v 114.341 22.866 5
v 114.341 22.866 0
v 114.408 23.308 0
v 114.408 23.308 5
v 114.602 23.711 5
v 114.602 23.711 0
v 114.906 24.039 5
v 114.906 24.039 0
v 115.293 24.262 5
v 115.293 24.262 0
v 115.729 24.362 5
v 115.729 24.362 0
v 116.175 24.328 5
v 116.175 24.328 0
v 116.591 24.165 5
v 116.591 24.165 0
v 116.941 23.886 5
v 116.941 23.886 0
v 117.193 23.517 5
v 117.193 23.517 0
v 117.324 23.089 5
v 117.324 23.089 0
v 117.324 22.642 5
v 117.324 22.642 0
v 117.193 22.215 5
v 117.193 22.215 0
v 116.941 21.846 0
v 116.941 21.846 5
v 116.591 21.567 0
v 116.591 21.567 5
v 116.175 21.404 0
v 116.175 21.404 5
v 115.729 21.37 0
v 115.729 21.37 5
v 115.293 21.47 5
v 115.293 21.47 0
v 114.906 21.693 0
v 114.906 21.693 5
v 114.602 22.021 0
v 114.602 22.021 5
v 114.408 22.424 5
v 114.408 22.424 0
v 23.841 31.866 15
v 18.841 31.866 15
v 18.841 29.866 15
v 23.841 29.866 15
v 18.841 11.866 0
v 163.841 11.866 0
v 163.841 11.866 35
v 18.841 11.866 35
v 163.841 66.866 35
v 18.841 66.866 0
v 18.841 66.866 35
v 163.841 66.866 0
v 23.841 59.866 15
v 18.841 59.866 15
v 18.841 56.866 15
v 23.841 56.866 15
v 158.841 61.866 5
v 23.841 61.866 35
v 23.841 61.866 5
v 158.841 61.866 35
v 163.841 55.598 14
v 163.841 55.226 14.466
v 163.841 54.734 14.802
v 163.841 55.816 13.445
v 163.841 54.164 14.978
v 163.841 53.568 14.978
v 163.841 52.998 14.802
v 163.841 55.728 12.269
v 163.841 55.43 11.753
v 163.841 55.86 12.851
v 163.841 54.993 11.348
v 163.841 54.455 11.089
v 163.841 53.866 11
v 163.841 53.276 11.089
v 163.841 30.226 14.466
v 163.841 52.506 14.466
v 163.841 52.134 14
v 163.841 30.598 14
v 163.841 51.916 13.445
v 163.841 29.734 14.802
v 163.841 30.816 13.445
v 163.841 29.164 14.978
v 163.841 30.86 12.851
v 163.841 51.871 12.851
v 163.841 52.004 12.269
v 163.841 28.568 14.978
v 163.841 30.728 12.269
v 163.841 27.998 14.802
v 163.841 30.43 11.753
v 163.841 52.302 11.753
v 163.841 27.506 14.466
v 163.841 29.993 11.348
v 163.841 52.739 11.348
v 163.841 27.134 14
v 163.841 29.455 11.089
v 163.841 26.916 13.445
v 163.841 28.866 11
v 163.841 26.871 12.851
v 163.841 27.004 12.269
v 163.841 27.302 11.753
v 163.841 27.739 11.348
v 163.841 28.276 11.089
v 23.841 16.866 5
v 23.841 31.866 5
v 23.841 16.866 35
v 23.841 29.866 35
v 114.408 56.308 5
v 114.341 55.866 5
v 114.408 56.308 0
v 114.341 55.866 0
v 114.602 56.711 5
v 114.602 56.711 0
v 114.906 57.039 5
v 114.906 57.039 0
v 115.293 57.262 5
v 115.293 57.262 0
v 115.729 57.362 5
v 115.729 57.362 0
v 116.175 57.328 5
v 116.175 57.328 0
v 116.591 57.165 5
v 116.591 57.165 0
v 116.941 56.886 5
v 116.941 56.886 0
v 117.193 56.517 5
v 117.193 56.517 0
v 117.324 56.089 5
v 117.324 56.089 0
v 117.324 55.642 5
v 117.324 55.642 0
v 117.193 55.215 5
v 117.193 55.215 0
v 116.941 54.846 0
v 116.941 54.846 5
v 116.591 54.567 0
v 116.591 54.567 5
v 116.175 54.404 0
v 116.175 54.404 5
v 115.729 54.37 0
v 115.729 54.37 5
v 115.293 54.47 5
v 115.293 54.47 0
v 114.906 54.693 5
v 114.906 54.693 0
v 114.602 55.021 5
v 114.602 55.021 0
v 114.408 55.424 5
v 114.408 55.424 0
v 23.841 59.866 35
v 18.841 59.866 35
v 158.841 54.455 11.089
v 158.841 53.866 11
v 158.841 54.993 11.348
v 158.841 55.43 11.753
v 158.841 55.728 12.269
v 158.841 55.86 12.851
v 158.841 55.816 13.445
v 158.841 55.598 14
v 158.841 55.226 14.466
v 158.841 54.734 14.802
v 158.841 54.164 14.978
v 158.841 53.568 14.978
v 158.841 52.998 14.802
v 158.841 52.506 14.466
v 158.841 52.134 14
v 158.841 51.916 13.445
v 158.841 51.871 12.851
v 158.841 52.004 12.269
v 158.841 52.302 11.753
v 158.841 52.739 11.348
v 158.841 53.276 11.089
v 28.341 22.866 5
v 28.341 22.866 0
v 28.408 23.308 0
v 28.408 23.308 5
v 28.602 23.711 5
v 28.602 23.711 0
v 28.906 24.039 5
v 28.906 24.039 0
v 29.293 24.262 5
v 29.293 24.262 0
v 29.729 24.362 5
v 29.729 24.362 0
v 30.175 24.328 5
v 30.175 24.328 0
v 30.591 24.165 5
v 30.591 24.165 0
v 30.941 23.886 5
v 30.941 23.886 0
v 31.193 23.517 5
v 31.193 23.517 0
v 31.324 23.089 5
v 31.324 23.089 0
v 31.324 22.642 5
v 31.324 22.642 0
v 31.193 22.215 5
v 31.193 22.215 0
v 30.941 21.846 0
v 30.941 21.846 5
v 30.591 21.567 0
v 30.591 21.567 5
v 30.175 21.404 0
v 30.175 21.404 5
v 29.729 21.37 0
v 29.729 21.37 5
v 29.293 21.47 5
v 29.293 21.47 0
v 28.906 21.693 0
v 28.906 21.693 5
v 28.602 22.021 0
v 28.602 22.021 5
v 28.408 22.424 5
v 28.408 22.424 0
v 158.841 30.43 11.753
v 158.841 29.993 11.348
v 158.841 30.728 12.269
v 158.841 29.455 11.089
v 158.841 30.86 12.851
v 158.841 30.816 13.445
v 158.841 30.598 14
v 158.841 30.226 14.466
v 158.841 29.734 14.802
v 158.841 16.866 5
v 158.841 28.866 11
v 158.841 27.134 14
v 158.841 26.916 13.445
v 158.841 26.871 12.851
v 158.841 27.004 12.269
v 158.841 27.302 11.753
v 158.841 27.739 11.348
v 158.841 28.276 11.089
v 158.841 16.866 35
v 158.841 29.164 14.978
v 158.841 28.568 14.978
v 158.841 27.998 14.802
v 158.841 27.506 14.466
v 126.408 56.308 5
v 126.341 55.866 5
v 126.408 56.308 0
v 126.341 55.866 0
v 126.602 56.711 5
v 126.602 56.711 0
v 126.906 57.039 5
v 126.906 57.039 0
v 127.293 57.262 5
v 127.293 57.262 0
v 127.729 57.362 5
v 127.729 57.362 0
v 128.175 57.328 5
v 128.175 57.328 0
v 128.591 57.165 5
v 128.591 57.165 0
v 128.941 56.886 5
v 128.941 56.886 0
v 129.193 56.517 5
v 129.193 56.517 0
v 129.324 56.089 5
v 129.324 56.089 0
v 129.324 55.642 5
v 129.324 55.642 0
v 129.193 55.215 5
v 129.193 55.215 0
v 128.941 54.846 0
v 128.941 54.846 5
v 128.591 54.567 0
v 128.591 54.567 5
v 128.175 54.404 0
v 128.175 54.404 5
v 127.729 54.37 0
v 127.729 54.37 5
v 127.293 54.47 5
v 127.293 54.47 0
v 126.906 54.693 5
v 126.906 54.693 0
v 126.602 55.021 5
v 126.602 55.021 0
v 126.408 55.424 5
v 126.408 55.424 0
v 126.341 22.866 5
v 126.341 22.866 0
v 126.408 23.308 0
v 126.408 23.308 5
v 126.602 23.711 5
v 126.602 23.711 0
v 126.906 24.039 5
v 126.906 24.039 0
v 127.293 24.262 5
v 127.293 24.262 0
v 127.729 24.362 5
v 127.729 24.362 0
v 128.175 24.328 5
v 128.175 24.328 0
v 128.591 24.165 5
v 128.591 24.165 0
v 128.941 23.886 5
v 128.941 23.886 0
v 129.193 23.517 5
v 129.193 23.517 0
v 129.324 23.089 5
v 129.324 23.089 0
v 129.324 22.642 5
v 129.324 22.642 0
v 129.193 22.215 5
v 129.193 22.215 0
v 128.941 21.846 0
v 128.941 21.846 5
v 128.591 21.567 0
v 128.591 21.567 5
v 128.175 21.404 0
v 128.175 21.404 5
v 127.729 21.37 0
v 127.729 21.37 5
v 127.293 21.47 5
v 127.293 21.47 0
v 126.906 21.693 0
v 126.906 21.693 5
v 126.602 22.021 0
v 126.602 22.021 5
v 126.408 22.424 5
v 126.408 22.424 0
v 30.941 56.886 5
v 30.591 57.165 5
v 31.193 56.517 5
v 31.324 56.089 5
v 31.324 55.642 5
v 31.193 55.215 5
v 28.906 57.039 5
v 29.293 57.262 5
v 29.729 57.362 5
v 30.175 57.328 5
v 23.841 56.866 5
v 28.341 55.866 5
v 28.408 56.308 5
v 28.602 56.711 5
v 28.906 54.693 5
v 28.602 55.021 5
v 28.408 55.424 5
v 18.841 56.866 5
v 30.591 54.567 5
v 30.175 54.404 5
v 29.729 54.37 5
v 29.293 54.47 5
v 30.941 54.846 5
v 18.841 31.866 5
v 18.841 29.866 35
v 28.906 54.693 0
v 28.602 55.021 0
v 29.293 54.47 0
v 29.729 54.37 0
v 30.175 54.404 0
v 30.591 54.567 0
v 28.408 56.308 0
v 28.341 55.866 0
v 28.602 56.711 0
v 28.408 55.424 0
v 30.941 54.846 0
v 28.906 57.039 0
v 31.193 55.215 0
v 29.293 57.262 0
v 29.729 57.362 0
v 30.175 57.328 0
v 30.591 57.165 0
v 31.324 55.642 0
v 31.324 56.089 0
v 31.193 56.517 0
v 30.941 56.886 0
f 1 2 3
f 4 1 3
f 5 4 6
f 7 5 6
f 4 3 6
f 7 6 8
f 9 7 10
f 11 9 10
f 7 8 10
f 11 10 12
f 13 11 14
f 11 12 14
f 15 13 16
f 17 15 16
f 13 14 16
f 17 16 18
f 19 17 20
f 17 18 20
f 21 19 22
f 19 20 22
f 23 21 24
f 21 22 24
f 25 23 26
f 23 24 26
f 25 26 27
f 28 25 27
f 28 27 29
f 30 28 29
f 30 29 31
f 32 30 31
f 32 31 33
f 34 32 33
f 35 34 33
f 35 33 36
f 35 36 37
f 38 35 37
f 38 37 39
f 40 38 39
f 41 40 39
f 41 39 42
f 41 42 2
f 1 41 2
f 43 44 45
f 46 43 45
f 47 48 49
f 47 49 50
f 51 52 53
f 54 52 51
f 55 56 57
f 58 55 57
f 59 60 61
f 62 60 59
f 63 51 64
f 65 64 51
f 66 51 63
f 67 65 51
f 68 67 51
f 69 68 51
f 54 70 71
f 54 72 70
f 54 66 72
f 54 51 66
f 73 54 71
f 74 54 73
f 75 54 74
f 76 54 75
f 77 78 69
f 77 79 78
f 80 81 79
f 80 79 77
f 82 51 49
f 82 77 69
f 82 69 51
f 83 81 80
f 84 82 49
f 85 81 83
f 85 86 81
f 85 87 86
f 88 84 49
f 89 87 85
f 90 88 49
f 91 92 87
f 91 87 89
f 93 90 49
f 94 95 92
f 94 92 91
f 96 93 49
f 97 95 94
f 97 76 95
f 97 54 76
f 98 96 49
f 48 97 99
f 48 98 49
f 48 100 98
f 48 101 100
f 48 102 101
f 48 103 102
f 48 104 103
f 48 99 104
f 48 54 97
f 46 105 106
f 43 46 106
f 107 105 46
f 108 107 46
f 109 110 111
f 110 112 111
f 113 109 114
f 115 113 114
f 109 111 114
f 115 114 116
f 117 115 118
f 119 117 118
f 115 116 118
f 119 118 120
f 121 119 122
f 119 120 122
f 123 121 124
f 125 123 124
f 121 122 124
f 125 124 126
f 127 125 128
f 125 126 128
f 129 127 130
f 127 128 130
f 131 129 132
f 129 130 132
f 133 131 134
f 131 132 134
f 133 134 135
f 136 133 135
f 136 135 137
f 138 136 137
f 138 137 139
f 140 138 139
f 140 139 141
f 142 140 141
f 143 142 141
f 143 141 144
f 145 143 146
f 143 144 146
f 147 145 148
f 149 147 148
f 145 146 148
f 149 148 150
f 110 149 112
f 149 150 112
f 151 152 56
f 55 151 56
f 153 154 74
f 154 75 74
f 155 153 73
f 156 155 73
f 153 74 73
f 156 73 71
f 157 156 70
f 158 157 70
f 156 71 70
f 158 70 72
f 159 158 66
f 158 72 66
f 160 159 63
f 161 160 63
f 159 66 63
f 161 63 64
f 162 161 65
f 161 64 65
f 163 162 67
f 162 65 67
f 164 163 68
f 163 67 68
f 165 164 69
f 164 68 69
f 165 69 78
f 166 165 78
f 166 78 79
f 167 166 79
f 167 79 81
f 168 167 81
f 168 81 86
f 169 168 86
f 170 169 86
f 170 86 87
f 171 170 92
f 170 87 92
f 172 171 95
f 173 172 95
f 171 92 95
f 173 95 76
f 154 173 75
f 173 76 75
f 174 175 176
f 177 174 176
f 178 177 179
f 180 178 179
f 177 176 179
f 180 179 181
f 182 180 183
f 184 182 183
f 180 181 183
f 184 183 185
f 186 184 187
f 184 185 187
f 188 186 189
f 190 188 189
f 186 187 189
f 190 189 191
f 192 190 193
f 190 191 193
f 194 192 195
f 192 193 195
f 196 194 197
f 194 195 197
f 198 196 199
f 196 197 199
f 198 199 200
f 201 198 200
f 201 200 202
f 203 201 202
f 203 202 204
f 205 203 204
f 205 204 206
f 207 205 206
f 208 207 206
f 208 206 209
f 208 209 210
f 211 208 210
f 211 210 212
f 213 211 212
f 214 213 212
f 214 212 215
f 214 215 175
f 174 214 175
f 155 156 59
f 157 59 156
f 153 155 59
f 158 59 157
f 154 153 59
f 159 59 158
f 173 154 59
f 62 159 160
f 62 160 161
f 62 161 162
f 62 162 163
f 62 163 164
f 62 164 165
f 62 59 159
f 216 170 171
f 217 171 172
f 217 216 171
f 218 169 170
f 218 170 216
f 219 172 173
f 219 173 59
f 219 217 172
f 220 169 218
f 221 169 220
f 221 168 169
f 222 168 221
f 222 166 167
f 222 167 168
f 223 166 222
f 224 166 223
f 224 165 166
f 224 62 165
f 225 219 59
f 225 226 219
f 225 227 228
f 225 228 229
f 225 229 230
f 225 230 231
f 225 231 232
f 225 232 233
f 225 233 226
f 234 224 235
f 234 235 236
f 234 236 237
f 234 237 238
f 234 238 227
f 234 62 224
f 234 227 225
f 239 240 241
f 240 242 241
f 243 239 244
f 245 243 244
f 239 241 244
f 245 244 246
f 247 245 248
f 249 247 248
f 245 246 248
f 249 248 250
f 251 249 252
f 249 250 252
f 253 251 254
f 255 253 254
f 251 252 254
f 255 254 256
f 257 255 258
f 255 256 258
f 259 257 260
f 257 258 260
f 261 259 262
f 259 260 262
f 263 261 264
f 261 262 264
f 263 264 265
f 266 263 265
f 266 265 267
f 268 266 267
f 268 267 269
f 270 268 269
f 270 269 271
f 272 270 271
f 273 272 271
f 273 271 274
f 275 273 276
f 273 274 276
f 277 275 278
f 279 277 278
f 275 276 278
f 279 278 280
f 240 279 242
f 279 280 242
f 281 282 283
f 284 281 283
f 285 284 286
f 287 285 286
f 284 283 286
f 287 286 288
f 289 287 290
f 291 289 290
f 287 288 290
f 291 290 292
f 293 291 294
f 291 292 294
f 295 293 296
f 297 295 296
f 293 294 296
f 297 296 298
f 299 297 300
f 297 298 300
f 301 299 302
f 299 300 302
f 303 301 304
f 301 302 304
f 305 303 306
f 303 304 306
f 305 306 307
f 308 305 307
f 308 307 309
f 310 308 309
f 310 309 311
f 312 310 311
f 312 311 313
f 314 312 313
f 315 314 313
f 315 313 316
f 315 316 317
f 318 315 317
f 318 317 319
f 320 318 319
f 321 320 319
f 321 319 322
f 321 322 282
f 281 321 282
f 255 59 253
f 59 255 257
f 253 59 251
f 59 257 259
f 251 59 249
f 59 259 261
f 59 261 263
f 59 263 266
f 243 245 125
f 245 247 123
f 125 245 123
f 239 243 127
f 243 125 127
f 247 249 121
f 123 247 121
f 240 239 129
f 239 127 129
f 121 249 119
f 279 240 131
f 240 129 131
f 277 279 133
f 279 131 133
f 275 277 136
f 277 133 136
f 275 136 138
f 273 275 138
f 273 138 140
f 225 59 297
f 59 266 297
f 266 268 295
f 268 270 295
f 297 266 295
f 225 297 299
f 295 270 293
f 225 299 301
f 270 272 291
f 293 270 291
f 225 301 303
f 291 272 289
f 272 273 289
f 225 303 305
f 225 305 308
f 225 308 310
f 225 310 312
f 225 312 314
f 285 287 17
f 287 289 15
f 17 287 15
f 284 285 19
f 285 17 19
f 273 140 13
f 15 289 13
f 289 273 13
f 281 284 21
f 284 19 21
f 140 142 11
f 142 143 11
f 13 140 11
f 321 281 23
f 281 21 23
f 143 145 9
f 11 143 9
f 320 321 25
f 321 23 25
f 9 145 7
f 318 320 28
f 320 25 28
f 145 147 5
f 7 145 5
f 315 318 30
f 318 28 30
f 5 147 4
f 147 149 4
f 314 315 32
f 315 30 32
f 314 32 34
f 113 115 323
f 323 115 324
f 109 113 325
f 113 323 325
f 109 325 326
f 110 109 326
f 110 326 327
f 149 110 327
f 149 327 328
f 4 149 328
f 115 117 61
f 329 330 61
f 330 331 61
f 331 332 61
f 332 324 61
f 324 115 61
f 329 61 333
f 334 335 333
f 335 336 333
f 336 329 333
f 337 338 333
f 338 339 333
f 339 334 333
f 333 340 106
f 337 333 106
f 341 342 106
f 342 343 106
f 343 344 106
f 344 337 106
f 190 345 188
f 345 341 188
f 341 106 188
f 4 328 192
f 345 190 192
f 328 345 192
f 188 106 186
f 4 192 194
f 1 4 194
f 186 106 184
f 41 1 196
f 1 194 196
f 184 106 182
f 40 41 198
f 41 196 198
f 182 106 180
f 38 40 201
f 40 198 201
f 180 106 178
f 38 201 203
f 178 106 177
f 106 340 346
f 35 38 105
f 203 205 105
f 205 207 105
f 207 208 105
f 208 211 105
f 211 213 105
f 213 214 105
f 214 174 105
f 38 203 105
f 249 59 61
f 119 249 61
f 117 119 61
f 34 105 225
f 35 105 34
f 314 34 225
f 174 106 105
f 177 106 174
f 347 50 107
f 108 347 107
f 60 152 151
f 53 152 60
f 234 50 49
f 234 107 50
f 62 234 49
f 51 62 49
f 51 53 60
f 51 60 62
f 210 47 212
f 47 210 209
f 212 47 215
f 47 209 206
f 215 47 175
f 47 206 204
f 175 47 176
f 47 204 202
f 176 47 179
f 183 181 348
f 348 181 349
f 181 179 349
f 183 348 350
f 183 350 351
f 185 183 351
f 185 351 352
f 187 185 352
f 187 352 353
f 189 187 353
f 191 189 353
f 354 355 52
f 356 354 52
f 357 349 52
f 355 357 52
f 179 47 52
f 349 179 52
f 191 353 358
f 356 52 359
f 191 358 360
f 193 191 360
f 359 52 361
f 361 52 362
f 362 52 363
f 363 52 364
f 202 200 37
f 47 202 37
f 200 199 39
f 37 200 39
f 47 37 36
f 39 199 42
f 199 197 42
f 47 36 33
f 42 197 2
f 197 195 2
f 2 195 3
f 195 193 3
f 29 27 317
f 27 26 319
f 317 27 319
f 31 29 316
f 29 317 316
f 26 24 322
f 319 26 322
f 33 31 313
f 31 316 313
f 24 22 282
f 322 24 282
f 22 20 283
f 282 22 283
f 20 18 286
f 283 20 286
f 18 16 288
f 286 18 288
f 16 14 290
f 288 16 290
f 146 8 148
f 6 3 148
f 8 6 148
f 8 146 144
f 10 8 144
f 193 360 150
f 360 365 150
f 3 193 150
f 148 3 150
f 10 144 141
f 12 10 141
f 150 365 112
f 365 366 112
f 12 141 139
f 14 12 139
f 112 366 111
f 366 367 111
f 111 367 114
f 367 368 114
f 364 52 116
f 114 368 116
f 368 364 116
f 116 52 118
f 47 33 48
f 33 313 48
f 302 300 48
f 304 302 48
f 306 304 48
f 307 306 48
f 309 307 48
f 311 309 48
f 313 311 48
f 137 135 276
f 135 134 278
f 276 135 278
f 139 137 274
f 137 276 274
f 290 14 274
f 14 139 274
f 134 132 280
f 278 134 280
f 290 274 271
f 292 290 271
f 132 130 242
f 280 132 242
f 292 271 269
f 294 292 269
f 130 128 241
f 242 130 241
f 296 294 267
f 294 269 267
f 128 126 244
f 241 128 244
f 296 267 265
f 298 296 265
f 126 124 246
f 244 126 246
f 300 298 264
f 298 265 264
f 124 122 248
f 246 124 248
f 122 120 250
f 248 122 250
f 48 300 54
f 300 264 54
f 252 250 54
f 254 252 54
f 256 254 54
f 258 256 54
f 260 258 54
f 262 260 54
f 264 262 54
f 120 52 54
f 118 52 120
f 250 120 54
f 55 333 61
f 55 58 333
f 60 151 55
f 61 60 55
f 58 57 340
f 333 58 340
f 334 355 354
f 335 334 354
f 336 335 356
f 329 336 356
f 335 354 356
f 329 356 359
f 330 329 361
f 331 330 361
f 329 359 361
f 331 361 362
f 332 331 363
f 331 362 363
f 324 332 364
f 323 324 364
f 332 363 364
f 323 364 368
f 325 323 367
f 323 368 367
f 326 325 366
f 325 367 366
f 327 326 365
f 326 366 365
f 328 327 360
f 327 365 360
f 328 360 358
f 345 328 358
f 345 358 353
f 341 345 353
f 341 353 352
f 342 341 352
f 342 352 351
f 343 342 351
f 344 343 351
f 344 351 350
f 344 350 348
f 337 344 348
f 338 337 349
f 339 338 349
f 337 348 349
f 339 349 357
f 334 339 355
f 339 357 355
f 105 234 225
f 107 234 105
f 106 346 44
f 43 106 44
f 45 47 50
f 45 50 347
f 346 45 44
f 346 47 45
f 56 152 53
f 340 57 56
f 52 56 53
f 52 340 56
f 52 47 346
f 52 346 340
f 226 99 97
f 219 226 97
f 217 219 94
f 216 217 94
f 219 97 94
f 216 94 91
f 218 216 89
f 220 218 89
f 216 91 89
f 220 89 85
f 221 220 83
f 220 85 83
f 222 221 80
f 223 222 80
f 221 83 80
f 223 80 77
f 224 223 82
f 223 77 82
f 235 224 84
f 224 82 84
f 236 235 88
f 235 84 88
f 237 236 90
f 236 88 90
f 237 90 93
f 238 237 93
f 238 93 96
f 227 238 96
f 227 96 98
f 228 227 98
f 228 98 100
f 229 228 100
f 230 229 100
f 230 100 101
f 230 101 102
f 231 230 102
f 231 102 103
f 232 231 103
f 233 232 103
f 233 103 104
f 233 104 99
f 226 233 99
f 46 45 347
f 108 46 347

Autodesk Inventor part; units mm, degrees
ref_plane "YZ Plane" through (0, 0, 0) normal (1, 0, 0) x (0, 1, 0)
ref_plane "XZ Plane" through (0, 0, 0) normal (0, 1, 0) x (-1, 0, 0)
ref_plane "XY Plane" through (0, 0, 0) normal (0, 0, 1) x (1, 0, 0)
sketch "Sketch1" plane through (0, 0, 0) normal (0, 0, 1) x (1, 0, 0)
  line L0 (18.8411, 66.8659) -> (163.8411, 66.8659)
  line L1 (163.8411, 66.8659) -> (163.8411, 11.8659)
  line L2 (163.8411, 11.8659) -> (18.8411, 11.8659)
  line L3 (18.8411, 11.8659) -> (18.8411, 66.8659)
  point P0 (0, 0)
  dimension "d0" = 55
  dimension "d1" = 145
extrude "Extrusion1" add sketch "Sketch1" along normal blind 35
sketch "Sketch2" plane through (0, 0, 35) normal (0, 0, 1) x (1, 0, 0)
  line L0 (23.8411, 61.8659) -> (158.8411, 61.8659)
  line L1 (158.8411, 61.8659) -> (158.8411, 16.8659)
  line L2 (158.8411, 16.8659) -> (23.8411, 16.8659)
  line L3 (23.8411, 16.8659) -> (23.8411, 61.8659)
  line L4 (18.8411, 66.8659) -> (18.8411, 11.8659) projected
  line L5 (163.8411, 66.8659) -> (18.8411, 66.8659) projected
  line L6 (163.8411, 11.8659) -> (163.8411, 66.8659) projected
  line L7 (18.8411, 11.8659) -> (163.8411, 11.8659) projected
  point P0 (0, 0)
  dimension "d4" = 5
  dimension "d5" = 5
  dimension "d6" = 5
  dimension "d7" = 5
extrude "Extrusion2" cut sketch "Sketch2" against normal blind 30 contours L0 L1 L2 L3
sketch "Sketch3" plane through (0, 0, 0) normal (0, 0, -1) x (-1, 0, 0)
  circle A0 centre (-29.8411, 22.8659) radius 1.5
  circle A1 centre (-29.8411, 55.8659) radius 1.5
  line L0 (-18.8411, 66.8659) -> (-18.8411, 11.8659) projected
  line L1 (-18.8411, 11.8659) -> (-163.8411, 11.8659) projected
  line L2 (-163.8411, 66.8659) -> (-18.8411, 66.8659) projected
  circle A2 centre (-127.8411, 55.8659) radius 1.5
  circle A3 centre (-127.8411, 22.8659) radius 1.5
  line L3 (-163.8411, 11.8659) -> (-163.8411, 66.8659) projected
  circle A4 centre (-115.8411, 55.8659) radius 1.5
  circle A5 centre (-115.8411, 22.8659) radius 1.5
  point P0 (0, 0)
  dimension "d10" = 3
  dimension "d11" = 11
  dimension "d12" = 11
  dimension "d13" = 11
  dimension "d14" = 11
  dimension "d15" = 3
  dimension "d19" = 3
  dimension "d20" = 3
  dimension "d24" = 36
  dimension "d26" = 12
  dimension "d27" = 36
  dimension "d28" = 12
  dimension "d29" = 3
  dimension "d30" = 3
  dimension "d31" = 11
  dimension "d32" = 11
  dimension "d33" = 11
  dimension "d34" = 11
extrude "Extrusion3" cut sketch "Sketch3" against normal blind 30 contours A0 | A1 | A2 | A3 | A4 | A5
sketch "Sketch4" plane through (18.8411, 11.8659, 0) normal (-1, 0, 0) x (0, 0, 1)
  line L0 (35, 0) -> (35, 55) projected
  line L1 (35, 48) -> (15, 48)
  line L2 (15, 48) -> (15, 18)
  line L3 (15, 18) -> (35, 18)
  line L4 (35, 18) -> (35, 48)
  line L5 (0, 55) -> (35, 55) projected
  line L6 (15, 20) -> (15, 40)
  line L7 (15, 45) -> (5, 45)
  line L8 (5, 45) -> (5, 20)
  line L9 (5, 20) -> (15, 20)
  line L10 (15, 20) -> (15, 45)
  line L11 (0, 55) -> (0, 0) projected
  point P0 (0, -11.8659)
  point P1 (35, 18)
  point P2 (15, 20)
  point P3 (15, 20)
  dimension "d37" = 7
  dimension "d38" = 30
  dimension "d44" = 10
  dimension "d45" = 25
  dimension "d46" = 5
  dimension "d47" = 15
extrude "Extrusion4" cut sketch "Sketch4" against normal blind 30
sketch "Sketch5" plane through (163.8411, 11.8659, 0) normal (1, 0, 0) x (0, 0, -1)
  circle A0 centre (-13, 17) radius 2
  circle A1 centre (-13, 42) radius 2
  line L0 (0, 0) -> (0, 55) projected
  line L1 (0, 0) -> (-35, 0) projected
  dimension "d48" = 4
  dimension "d49" = 4
  dimension "d50" = 25
  dimension "d51" = 13
  dimension "d52" = 13
  dimension "d53" = 17
extrude "Extrusion5" cut sketch "Sketch5" against normal blind 30
properties part number "arduino mould_thicker"
